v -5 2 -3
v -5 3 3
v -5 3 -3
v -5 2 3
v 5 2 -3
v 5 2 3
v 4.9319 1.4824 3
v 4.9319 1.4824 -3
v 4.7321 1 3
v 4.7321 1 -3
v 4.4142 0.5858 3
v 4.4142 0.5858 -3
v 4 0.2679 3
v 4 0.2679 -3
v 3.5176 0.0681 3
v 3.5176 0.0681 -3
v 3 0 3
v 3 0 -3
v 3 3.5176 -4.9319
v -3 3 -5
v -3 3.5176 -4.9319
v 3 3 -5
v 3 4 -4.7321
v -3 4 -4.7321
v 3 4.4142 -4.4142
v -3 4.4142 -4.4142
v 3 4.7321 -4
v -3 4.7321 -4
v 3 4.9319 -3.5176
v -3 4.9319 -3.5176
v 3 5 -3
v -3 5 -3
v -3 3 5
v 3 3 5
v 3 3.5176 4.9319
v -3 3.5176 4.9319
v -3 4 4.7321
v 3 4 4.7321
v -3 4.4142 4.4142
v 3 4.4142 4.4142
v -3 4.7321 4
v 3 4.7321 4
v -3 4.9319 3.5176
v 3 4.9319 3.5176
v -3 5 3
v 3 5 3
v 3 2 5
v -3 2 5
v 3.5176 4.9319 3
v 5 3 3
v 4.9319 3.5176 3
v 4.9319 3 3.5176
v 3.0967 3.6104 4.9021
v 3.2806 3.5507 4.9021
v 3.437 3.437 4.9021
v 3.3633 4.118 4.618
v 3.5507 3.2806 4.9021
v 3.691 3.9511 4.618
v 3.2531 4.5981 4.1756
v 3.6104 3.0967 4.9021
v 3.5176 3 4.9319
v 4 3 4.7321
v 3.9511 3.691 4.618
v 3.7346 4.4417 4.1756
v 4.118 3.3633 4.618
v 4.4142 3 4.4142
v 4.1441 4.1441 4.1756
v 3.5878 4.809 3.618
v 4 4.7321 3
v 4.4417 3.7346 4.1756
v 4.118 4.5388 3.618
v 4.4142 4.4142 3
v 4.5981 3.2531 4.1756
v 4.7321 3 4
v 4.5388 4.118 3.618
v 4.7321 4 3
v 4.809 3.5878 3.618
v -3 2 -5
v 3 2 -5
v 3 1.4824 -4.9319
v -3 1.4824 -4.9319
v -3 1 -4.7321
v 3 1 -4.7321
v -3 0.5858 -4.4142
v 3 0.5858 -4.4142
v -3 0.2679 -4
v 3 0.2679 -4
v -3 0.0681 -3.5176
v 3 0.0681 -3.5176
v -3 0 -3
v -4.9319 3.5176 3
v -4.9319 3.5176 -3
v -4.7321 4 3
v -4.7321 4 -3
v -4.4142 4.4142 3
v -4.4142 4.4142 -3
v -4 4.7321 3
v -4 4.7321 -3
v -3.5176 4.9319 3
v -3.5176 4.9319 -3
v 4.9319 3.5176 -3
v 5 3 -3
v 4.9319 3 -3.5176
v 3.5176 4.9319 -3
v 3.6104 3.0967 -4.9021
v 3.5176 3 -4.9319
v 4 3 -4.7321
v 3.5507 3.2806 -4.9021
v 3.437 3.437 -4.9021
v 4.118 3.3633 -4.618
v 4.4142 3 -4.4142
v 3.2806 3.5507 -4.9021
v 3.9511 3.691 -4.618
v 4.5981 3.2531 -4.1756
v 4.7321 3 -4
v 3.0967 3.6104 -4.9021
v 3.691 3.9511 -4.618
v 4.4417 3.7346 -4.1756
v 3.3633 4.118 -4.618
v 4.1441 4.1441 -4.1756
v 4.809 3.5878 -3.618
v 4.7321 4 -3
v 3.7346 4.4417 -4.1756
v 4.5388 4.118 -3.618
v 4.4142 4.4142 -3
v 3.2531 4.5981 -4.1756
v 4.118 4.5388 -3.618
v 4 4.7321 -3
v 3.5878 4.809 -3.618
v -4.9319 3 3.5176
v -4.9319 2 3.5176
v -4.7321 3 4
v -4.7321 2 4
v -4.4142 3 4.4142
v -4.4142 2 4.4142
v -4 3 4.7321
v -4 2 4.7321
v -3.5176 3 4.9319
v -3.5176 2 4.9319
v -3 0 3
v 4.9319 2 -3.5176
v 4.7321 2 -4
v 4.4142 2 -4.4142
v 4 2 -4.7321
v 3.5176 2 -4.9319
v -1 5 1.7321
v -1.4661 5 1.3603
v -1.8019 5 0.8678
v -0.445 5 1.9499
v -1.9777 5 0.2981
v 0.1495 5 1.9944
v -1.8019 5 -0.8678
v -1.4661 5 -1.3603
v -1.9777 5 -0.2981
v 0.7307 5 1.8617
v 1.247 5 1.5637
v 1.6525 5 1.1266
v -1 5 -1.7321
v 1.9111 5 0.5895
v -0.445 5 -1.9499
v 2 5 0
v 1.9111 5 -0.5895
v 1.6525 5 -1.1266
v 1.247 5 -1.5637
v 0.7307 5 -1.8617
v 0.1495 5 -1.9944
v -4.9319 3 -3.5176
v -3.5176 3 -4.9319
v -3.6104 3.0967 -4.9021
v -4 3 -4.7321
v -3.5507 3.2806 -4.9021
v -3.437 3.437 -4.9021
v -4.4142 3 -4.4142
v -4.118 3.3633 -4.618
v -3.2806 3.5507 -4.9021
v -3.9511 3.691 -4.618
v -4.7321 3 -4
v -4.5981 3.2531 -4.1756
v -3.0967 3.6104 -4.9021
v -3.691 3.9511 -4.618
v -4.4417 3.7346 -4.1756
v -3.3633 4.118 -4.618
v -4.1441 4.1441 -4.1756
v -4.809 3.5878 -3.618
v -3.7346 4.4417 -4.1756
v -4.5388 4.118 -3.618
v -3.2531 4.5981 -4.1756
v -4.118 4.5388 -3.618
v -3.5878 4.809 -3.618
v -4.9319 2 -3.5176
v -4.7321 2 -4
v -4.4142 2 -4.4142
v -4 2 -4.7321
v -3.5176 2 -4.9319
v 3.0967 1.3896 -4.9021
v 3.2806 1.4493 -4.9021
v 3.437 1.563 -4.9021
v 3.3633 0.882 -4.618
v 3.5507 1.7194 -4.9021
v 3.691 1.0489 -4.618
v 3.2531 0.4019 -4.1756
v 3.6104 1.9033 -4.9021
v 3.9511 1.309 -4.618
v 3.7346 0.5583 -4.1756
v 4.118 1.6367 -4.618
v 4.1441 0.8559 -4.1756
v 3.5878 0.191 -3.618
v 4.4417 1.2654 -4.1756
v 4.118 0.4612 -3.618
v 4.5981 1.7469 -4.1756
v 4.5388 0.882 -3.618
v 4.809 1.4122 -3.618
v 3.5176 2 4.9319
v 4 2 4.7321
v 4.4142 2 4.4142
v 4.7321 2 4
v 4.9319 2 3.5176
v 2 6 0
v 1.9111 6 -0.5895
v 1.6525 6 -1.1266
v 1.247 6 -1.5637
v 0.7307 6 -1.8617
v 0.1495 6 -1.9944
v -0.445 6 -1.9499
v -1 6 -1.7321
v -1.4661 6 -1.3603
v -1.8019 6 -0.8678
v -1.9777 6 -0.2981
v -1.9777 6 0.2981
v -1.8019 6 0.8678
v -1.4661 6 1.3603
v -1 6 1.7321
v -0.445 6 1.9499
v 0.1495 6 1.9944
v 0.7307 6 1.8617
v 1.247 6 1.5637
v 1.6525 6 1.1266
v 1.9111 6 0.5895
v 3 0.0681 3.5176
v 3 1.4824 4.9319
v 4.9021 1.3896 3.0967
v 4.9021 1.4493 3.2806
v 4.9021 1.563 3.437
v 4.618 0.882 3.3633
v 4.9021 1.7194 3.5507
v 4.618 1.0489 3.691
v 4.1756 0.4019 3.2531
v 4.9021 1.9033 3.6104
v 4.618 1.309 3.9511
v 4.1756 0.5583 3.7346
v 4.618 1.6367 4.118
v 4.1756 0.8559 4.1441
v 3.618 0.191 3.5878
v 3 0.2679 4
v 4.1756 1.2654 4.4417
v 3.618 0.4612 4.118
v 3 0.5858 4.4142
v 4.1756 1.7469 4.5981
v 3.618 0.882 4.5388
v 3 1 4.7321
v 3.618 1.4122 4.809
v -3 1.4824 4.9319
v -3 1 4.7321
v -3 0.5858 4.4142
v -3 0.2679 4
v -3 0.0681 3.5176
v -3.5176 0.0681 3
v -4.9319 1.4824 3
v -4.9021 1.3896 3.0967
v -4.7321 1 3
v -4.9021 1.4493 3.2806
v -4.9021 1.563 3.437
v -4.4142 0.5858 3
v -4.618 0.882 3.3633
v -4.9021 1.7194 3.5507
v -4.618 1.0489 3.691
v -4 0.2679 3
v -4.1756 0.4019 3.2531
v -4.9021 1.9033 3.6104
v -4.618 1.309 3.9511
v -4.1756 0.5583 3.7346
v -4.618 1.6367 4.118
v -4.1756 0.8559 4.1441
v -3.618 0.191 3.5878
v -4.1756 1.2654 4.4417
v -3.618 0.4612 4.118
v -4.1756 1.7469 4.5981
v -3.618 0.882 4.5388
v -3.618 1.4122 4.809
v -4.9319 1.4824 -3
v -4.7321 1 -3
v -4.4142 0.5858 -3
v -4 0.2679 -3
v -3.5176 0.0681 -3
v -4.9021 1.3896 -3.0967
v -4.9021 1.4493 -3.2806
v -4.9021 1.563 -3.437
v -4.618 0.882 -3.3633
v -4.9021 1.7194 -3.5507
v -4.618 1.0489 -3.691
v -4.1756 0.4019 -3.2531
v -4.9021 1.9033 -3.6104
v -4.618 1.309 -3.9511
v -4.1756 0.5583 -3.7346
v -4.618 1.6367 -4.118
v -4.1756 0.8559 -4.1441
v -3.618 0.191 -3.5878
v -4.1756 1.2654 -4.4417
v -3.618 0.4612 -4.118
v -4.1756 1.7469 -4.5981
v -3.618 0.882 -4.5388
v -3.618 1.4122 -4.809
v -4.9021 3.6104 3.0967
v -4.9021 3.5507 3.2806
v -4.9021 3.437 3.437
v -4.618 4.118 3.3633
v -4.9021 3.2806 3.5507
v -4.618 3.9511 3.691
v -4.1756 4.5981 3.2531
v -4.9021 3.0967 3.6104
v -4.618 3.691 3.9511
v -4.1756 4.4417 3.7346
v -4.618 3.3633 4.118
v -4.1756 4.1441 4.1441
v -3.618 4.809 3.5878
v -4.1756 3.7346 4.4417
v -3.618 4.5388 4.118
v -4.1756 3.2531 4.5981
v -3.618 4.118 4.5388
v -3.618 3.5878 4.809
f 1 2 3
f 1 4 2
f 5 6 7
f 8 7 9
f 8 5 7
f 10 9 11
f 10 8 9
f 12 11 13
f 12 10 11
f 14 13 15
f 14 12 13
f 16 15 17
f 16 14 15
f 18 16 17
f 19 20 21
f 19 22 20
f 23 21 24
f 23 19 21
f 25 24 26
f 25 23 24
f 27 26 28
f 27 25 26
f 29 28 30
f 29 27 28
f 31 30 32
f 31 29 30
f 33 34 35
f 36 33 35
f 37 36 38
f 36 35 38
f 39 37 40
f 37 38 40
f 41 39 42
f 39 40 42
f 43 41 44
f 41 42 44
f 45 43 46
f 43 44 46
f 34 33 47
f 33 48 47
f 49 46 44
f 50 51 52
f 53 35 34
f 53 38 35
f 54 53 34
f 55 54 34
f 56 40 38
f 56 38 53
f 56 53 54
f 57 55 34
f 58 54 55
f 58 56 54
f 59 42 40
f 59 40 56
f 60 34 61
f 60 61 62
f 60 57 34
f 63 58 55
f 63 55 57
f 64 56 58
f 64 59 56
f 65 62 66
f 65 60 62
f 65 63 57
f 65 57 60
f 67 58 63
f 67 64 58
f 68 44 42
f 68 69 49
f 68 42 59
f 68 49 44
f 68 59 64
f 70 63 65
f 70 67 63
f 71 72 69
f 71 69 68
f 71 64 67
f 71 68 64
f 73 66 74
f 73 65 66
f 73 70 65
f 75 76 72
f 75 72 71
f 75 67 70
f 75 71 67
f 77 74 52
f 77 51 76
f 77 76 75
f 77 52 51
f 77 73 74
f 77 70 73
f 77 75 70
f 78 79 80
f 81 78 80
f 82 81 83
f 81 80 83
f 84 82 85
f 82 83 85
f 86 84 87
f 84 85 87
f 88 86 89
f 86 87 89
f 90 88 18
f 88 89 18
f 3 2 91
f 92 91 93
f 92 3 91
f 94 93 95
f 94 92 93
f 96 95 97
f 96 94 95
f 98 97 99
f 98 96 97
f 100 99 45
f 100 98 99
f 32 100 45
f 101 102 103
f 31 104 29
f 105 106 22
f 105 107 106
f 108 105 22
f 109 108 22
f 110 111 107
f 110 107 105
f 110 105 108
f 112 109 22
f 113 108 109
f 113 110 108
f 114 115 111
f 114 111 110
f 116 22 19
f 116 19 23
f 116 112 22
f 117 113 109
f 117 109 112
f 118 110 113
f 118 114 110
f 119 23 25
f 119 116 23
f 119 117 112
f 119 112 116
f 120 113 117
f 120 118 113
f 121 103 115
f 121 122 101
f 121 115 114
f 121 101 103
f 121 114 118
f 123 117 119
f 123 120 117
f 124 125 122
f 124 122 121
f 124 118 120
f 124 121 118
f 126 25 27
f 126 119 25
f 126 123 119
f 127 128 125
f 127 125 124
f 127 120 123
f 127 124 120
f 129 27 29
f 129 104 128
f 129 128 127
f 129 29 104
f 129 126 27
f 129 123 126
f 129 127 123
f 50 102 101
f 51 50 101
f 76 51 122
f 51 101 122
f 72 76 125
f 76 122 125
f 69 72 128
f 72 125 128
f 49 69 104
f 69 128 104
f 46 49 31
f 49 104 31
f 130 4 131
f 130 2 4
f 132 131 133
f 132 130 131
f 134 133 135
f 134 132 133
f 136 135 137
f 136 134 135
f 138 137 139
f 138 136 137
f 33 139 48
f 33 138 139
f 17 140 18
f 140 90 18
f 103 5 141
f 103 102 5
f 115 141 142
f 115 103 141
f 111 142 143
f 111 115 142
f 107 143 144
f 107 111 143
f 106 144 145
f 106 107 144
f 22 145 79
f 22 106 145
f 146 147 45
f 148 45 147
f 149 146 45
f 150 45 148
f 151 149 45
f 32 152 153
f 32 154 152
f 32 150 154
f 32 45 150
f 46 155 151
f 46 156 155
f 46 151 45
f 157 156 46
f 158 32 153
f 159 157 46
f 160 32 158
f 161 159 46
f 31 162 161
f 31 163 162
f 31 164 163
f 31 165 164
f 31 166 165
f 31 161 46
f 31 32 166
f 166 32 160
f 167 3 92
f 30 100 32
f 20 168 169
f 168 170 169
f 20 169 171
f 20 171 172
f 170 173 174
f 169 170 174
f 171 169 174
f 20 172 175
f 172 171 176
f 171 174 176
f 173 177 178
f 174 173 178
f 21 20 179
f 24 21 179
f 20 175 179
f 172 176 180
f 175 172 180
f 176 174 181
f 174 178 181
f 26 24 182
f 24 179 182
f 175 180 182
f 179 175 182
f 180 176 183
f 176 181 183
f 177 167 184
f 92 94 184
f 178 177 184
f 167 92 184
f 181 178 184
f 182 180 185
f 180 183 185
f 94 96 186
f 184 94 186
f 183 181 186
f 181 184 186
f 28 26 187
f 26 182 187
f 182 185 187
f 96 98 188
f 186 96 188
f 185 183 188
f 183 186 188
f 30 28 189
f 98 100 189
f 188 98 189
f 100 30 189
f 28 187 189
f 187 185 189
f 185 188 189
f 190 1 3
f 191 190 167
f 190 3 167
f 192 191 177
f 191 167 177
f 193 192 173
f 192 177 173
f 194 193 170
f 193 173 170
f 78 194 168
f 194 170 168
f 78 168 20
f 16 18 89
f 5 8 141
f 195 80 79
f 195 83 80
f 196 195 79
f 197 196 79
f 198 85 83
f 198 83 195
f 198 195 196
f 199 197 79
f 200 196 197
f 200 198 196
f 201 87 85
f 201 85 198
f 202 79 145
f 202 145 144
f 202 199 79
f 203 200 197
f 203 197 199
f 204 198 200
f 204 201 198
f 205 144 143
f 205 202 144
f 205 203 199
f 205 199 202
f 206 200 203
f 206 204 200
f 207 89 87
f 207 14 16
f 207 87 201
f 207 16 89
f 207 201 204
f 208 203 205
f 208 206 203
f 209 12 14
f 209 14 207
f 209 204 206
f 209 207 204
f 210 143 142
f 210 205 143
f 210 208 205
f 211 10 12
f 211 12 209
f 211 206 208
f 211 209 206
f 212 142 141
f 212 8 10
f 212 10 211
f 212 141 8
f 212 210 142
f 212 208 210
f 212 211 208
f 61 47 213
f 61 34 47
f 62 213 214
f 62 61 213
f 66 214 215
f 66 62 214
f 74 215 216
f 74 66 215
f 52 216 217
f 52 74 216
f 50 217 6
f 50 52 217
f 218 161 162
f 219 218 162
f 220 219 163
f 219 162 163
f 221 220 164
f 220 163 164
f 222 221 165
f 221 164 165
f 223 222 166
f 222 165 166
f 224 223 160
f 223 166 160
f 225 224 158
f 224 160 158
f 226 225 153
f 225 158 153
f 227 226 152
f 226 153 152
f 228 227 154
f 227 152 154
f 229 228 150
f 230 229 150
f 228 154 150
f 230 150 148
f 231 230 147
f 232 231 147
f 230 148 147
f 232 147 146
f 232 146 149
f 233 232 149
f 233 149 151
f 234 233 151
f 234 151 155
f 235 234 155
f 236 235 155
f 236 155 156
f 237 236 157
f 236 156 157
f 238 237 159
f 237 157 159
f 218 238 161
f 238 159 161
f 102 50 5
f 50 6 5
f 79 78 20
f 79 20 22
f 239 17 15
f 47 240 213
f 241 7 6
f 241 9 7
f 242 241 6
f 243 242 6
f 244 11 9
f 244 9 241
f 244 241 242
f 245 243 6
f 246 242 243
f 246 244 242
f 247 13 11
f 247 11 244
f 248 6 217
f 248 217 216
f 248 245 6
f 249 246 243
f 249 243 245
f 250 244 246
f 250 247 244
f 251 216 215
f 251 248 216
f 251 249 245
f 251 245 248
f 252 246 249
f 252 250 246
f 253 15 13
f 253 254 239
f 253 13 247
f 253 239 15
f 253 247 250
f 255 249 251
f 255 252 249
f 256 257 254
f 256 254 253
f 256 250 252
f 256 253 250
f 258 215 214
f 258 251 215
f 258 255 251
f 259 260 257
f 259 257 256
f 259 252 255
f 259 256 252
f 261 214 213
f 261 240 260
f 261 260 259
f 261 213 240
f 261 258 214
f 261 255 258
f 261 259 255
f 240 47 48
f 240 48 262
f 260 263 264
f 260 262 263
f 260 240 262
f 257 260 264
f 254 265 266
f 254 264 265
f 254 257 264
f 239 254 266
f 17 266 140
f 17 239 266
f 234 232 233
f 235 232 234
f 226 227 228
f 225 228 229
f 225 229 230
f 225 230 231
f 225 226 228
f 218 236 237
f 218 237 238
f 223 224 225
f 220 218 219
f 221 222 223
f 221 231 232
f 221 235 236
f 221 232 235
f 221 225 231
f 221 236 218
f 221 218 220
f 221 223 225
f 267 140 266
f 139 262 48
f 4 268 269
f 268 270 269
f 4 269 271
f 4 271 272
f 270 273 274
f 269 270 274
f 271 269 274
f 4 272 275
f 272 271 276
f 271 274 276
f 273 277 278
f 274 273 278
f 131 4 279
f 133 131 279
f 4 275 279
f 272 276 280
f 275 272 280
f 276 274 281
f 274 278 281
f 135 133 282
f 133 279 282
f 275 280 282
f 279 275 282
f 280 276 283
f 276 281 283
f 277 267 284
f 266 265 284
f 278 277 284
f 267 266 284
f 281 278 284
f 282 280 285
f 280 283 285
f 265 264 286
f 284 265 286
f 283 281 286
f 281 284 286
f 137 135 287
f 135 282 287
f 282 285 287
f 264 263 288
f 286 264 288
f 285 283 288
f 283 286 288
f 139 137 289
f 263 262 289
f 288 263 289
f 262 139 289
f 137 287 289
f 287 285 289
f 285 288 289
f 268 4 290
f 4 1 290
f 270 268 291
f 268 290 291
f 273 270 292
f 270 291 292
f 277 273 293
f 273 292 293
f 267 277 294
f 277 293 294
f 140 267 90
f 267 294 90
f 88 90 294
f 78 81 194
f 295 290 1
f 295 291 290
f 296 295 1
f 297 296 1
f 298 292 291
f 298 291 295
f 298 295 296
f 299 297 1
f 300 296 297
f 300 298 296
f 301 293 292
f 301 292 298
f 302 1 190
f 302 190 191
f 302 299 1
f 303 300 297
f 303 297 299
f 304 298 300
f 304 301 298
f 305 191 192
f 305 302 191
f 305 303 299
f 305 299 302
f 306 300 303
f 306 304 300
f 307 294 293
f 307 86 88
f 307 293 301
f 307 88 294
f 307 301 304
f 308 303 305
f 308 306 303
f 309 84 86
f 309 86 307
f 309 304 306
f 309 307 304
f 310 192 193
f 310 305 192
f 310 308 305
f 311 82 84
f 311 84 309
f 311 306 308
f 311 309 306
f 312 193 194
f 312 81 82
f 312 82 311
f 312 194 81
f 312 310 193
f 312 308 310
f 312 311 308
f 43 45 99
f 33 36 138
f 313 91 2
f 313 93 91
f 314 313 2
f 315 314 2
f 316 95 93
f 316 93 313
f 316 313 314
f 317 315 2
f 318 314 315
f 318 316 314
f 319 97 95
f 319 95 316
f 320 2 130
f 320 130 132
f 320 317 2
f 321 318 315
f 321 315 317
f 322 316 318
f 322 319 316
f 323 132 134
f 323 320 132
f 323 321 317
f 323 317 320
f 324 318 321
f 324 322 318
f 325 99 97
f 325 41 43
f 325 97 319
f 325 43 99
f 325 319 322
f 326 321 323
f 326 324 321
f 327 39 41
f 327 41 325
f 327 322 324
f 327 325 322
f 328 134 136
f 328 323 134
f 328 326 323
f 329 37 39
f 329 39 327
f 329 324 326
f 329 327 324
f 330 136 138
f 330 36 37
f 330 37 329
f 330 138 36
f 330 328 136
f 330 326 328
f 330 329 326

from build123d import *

# Parameters (mm, degrees)
SKETCH_1_W      = 10
SKETCH_1_H      = 10
EXTRUDE_1_DEPTH = 5
FILLET_2_R      = 2
SKETCH_2_R      = 2
EXTRUDE_2_DEPTH = 1


with BuildPart() as part:
    # 草图1 → 凸台-拉伸1 (new body)
    with BuildSketch(Plane(origin=(0, 0, 0), x_dir=(1, 0, 0), z_dir=(0, 1, 0))):
        Rectangle(SKETCH_1_W, SKETCH_1_H)
    extrude(amount=EXTRUDE_1_DEPTH)

    # 圆角2
    fillet_2_edges = [part.edges().sort_by_distance(p)[0] for p in [
        (5, 5, 0),
        (0, 5, 5),
        (-5, 5, 0),
        (0, 0, 5),
        (5, 0, 0),
        (0, 0, -5),
        (-5, 0, 0),
        (-5, 2.5, 5),
        (5, 2.5, 5),
        (5, 2.5, -5),
        (-5, 2.5, -5),
        (0, 5, -5),
    ]]
    fillet(fillet_2_edges, radius=FILLET_2_R)

    # 草图2 → 凸台-拉伸2 (add)
    with BuildSketch(Plane(origin=(0, 5, 0), x_dir=(1, 0, 0), z_dir=(0, 1, 0))):
        Circle(SKETCH_2_R)
    extrude(amount=EXTRUDE_2_DEPTH)


solid = part.part
